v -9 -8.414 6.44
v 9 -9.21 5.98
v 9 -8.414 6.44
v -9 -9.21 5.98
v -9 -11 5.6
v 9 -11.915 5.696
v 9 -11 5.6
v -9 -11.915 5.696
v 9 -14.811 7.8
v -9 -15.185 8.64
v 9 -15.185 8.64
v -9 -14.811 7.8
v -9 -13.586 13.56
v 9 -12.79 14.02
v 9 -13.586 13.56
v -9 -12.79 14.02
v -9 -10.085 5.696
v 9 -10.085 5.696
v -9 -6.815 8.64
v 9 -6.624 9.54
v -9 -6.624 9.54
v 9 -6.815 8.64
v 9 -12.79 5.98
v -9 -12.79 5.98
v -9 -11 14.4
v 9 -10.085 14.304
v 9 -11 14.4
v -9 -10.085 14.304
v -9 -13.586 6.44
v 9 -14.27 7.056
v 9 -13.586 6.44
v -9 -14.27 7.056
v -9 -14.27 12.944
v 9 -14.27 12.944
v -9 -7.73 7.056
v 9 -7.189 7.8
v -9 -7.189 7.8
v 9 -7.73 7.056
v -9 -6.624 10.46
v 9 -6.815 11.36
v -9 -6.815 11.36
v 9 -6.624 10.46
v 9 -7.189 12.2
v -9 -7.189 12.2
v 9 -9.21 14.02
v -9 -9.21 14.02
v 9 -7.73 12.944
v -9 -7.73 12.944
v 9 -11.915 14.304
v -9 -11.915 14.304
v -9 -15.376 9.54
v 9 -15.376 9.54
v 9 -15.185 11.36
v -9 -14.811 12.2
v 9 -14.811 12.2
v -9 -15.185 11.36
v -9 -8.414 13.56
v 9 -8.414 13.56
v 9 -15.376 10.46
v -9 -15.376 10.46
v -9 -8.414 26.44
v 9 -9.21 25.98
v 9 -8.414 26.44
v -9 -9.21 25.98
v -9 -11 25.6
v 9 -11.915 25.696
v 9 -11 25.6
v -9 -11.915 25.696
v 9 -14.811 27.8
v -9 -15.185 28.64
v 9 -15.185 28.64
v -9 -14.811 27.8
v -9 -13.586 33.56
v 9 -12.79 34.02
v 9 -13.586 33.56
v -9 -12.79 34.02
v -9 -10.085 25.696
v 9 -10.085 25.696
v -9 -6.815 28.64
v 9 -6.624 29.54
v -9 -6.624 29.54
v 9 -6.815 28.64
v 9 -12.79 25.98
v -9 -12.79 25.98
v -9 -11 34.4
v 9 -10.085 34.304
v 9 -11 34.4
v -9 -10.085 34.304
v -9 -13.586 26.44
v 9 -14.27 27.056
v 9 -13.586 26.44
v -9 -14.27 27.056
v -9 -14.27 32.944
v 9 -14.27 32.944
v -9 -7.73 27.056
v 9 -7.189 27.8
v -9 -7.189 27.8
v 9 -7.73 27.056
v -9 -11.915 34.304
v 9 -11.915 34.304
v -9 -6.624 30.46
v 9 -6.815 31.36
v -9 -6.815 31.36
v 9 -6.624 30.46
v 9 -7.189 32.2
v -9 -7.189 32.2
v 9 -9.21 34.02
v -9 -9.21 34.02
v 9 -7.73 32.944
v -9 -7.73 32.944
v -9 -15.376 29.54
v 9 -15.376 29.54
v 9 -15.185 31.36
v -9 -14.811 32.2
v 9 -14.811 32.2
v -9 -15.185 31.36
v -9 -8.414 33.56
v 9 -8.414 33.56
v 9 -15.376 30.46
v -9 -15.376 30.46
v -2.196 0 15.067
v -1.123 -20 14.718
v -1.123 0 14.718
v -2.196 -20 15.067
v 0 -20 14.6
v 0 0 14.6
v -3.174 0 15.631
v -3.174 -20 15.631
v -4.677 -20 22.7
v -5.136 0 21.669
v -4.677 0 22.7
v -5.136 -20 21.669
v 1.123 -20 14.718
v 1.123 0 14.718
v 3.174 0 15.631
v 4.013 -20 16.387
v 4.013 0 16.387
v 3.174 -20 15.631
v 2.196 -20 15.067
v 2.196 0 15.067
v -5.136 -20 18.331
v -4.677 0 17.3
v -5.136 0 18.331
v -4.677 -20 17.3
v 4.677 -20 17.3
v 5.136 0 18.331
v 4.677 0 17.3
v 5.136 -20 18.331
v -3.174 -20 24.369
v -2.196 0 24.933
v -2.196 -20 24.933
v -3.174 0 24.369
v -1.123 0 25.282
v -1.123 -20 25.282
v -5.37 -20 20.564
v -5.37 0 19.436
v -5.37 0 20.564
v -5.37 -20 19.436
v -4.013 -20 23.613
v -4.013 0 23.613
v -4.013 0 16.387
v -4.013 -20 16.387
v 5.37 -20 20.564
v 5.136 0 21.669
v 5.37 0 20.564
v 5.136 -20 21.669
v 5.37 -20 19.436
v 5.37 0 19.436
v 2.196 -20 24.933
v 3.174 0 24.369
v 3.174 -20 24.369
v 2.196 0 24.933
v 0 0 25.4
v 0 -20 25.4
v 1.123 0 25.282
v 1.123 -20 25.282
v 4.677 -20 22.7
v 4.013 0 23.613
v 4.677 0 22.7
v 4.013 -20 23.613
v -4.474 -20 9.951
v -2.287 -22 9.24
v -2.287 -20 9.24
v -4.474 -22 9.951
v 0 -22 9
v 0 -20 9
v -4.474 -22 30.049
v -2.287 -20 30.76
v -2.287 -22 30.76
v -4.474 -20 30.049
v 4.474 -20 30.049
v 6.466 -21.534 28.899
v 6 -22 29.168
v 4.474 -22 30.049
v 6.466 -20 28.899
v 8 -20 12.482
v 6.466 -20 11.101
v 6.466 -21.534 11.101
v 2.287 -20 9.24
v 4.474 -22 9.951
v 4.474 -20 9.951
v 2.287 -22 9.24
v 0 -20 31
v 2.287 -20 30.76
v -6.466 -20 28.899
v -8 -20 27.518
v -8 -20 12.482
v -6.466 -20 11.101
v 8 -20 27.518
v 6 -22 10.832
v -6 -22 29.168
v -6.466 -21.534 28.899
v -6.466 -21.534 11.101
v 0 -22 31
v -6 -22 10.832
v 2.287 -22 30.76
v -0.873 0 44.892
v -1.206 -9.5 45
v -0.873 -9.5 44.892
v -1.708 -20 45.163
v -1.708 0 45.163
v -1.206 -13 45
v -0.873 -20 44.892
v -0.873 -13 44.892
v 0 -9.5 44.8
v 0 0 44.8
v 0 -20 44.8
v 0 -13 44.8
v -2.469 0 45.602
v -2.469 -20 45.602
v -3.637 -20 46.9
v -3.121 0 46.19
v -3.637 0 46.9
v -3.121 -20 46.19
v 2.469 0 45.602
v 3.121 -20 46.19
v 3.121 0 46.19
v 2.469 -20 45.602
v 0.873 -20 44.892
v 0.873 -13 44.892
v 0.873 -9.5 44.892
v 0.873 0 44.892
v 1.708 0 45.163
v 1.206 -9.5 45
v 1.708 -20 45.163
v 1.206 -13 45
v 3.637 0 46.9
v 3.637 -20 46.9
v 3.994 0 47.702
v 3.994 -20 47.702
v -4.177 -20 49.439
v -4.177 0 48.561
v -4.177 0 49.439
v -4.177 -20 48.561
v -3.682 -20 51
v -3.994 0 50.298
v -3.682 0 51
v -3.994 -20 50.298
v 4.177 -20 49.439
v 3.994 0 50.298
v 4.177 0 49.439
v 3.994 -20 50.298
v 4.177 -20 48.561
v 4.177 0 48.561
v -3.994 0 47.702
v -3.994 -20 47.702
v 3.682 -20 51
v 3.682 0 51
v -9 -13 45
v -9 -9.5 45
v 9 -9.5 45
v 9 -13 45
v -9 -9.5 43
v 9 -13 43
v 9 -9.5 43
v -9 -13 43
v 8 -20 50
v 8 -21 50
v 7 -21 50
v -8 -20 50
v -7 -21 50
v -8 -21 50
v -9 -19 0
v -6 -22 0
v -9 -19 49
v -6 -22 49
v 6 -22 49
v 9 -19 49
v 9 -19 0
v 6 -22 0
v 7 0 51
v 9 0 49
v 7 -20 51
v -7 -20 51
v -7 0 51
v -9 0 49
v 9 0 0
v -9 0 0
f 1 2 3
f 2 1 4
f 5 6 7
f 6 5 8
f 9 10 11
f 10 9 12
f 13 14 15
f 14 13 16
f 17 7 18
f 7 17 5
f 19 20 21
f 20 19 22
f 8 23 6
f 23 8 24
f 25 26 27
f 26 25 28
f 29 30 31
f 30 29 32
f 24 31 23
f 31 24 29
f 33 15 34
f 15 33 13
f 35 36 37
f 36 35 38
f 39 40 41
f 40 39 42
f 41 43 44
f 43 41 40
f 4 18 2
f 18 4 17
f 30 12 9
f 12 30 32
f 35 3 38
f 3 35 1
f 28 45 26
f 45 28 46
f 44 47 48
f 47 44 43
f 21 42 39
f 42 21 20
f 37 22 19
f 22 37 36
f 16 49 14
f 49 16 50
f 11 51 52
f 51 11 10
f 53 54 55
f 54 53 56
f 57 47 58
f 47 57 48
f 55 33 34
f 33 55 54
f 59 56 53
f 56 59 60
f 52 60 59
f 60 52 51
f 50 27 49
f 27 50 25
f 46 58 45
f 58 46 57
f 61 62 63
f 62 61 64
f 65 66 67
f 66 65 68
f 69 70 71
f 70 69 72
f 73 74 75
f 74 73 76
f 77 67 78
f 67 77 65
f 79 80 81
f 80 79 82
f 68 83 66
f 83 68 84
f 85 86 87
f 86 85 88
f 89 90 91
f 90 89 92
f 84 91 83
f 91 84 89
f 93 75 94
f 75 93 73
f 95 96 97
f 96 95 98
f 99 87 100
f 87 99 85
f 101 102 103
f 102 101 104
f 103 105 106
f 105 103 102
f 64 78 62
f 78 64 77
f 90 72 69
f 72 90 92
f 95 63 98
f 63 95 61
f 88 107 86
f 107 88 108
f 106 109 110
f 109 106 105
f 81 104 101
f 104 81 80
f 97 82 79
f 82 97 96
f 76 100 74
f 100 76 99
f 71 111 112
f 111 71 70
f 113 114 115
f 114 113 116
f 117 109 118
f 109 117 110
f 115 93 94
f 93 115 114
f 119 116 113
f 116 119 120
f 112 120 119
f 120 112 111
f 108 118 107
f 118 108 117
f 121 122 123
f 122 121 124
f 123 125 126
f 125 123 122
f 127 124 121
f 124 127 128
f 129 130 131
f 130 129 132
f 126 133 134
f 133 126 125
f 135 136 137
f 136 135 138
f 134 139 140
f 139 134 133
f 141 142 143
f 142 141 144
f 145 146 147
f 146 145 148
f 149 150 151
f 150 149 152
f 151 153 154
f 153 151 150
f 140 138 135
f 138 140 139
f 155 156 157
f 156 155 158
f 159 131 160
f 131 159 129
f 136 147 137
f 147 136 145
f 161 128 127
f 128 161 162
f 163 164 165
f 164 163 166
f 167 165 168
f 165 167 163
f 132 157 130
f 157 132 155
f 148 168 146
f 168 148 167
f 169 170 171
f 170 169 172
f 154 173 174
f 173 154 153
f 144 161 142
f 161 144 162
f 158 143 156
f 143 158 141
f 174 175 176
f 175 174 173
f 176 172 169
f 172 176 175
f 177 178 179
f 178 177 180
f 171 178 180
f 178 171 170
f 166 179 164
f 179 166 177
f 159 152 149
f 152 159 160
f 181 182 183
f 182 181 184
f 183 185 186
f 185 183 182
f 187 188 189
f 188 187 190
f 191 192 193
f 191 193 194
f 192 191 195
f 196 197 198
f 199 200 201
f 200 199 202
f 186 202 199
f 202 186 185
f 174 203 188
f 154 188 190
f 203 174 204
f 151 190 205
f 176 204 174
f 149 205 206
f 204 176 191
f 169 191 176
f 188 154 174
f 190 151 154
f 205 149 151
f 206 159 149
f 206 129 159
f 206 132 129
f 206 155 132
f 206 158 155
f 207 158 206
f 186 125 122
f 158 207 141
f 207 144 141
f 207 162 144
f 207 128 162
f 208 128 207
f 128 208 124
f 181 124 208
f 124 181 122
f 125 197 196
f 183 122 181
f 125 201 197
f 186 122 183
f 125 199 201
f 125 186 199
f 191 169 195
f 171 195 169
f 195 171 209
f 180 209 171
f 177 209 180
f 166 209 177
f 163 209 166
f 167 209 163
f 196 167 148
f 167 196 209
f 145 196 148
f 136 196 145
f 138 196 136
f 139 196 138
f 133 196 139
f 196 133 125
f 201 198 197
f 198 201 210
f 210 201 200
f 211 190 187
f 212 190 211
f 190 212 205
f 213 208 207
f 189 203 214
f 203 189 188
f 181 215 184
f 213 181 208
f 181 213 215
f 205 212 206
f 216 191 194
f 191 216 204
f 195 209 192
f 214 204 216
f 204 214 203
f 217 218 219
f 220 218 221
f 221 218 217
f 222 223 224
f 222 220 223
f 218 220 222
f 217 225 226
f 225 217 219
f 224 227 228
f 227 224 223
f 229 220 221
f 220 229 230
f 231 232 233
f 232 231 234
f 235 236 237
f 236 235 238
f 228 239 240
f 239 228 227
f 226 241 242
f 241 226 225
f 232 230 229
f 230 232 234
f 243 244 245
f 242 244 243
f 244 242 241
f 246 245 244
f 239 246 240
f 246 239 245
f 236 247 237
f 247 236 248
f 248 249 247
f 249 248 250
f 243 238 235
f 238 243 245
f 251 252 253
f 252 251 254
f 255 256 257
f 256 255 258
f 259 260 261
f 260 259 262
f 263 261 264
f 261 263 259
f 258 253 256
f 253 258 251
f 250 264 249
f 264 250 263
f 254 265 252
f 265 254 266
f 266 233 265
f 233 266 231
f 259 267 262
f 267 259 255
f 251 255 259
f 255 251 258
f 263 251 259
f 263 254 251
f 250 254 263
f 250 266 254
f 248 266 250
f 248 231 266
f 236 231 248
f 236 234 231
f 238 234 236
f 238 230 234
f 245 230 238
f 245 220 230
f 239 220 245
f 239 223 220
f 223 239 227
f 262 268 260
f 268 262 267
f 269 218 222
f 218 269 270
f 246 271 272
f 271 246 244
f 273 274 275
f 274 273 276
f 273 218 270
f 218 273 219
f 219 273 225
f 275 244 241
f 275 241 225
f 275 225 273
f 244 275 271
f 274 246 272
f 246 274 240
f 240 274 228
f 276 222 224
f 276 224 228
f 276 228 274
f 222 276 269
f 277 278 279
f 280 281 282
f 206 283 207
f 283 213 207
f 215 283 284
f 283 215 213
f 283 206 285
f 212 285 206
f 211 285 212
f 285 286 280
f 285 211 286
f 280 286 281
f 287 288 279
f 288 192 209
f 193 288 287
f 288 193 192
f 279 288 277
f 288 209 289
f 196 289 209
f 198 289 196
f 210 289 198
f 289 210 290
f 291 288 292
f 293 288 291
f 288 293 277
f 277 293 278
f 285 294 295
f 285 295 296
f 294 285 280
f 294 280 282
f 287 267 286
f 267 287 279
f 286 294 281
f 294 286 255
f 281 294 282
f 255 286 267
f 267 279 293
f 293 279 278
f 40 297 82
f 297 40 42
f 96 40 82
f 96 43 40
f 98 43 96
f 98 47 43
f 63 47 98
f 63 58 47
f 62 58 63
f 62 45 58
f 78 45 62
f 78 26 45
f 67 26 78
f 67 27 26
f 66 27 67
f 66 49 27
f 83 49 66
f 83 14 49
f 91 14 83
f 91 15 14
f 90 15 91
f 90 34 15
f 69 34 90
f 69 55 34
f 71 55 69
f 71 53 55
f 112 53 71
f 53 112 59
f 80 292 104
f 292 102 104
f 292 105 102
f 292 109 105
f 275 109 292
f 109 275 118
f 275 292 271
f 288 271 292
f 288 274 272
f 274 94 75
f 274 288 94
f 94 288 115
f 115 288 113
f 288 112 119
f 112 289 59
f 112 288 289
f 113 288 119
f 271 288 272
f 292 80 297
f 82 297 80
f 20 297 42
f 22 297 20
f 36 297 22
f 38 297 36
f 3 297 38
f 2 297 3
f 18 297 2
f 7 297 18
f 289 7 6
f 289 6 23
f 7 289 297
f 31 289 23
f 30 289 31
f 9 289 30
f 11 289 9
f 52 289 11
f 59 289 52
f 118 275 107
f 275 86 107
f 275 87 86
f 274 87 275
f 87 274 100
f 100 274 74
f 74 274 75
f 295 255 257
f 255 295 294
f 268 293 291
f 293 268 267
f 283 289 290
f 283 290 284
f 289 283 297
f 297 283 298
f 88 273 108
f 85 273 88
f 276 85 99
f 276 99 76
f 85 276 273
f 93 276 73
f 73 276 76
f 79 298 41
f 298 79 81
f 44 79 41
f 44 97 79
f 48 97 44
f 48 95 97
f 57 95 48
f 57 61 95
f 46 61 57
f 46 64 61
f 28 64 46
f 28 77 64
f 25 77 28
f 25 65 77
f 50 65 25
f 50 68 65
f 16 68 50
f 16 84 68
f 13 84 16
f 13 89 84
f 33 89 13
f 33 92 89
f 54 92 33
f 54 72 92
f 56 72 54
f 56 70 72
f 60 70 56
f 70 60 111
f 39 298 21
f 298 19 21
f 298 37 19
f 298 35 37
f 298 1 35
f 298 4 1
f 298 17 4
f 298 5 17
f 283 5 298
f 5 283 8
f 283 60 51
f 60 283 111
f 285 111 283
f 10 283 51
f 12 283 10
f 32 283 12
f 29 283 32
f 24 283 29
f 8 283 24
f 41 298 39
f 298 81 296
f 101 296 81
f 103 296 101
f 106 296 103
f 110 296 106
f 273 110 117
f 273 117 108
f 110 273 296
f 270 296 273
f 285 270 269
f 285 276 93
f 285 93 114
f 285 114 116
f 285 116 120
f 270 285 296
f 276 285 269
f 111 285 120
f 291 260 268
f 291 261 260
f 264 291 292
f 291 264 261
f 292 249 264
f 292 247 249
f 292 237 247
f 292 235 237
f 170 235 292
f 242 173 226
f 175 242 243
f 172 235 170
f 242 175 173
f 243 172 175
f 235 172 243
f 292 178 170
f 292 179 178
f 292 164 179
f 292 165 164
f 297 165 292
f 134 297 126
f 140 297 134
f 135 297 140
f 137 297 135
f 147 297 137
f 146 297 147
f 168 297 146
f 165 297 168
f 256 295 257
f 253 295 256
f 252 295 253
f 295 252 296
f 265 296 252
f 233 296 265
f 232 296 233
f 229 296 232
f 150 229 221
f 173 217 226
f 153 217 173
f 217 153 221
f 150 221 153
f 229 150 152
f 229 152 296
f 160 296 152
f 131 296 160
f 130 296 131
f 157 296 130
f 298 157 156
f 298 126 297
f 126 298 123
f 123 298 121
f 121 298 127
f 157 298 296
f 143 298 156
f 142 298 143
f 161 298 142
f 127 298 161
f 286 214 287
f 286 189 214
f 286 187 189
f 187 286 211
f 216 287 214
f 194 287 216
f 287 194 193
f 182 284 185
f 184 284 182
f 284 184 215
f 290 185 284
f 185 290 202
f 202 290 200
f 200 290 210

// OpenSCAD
// PRUSA iteration3
// Y frame corners
// GNU GPL v3
// Josef Průša <iam@josefprusa.cz> and contributors
// http://www.reprap.org/wiki/Prusa_Mendel
// http://prusamendel.org

smoothrodoffset=4;

module corner_base(){	
// translate([-9,-11,0])cube([18,22,47]);
 translate([-9,-11,0])cube([18,22,47+smoothrodoffset]);

}

module corner_holes(){
 translate([-11,-11,0]){
  // Bottom hole
  translate([0,11,10]) rotate([0,90,0]) translate([0,0,-5]) cylinder(h = 270, r=4.4, $fn=30);
  // Top hole
  translate([0,11,30]) rotate([0,90,0]) translate([0,0,-5]) cylinder(h = 270, r=4.4, $fn=30);
  // Middle hole
  translate([11,0,20]) rotate([0,0,90]) rotate([0,90,0]) translate([0,0,-5]) cylinder(h = 270, r=5.4, $fn=30);

  // Washer hole
  translate([11,-3,20]) rotate([0,0,90]) rotate([0,90,0]) translate([0,0,-5]) cylinder(h = 10, r=11, $fn=30);

  // Top smooth rod insert
  // Smooth rod place
//  translate([11,2,45]) rotate([0,90,90]) cylinder(h = 270, r=4.2, $fn=30); 
  translate([11,2,45+smoothrodoffset]) rotate([0,90,90]) cylinder(h = 270, r=4.2, $fn=30); 
 
 // Ziptie
//  translate([-5,9,39])  cube([30,3.5,2]);
  translate([-5,9,39+smoothrodoffset])  cube([30,3.5,2]);
 }
}

module corner_fancy(){
// Side corner cutouts
  translate([-8,-9,0]) rotate([0,0,-45-180]) translate([-15,0,-1]) cube([30,30,51]);
  translate([8,-9,0]) rotate([0,0,45-180]) translate([-15,0,-1]) cube([30,30,51]);
// Top corner cutouts
  translate([7,0,49-2+smoothrodoffset]) rotate([0,45,0]) translate([-15,-15,0]) cube([30,30,30]);
  translate([-7,0,49-2+smoothrodoffset]) rotate([0,-45,0]) translate([-15,-15,0]) cube([30,30,30]);
  rotate([0,0,90]){
   translate([-9,0,49-2+smoothrodoffset]) rotate([0,-45,0]) translate([-15,-15,0]) cube([30,30,30]);
  }
}


// Final part
module corner(){
 // Rotate the part for better printing
 translate([0,0,11]) rotate([-90,0,0]) difference(){
  corner_base();
  corner_holes();
  corner_fancy();
 }
}

rotate([90,0,0]) corner();
